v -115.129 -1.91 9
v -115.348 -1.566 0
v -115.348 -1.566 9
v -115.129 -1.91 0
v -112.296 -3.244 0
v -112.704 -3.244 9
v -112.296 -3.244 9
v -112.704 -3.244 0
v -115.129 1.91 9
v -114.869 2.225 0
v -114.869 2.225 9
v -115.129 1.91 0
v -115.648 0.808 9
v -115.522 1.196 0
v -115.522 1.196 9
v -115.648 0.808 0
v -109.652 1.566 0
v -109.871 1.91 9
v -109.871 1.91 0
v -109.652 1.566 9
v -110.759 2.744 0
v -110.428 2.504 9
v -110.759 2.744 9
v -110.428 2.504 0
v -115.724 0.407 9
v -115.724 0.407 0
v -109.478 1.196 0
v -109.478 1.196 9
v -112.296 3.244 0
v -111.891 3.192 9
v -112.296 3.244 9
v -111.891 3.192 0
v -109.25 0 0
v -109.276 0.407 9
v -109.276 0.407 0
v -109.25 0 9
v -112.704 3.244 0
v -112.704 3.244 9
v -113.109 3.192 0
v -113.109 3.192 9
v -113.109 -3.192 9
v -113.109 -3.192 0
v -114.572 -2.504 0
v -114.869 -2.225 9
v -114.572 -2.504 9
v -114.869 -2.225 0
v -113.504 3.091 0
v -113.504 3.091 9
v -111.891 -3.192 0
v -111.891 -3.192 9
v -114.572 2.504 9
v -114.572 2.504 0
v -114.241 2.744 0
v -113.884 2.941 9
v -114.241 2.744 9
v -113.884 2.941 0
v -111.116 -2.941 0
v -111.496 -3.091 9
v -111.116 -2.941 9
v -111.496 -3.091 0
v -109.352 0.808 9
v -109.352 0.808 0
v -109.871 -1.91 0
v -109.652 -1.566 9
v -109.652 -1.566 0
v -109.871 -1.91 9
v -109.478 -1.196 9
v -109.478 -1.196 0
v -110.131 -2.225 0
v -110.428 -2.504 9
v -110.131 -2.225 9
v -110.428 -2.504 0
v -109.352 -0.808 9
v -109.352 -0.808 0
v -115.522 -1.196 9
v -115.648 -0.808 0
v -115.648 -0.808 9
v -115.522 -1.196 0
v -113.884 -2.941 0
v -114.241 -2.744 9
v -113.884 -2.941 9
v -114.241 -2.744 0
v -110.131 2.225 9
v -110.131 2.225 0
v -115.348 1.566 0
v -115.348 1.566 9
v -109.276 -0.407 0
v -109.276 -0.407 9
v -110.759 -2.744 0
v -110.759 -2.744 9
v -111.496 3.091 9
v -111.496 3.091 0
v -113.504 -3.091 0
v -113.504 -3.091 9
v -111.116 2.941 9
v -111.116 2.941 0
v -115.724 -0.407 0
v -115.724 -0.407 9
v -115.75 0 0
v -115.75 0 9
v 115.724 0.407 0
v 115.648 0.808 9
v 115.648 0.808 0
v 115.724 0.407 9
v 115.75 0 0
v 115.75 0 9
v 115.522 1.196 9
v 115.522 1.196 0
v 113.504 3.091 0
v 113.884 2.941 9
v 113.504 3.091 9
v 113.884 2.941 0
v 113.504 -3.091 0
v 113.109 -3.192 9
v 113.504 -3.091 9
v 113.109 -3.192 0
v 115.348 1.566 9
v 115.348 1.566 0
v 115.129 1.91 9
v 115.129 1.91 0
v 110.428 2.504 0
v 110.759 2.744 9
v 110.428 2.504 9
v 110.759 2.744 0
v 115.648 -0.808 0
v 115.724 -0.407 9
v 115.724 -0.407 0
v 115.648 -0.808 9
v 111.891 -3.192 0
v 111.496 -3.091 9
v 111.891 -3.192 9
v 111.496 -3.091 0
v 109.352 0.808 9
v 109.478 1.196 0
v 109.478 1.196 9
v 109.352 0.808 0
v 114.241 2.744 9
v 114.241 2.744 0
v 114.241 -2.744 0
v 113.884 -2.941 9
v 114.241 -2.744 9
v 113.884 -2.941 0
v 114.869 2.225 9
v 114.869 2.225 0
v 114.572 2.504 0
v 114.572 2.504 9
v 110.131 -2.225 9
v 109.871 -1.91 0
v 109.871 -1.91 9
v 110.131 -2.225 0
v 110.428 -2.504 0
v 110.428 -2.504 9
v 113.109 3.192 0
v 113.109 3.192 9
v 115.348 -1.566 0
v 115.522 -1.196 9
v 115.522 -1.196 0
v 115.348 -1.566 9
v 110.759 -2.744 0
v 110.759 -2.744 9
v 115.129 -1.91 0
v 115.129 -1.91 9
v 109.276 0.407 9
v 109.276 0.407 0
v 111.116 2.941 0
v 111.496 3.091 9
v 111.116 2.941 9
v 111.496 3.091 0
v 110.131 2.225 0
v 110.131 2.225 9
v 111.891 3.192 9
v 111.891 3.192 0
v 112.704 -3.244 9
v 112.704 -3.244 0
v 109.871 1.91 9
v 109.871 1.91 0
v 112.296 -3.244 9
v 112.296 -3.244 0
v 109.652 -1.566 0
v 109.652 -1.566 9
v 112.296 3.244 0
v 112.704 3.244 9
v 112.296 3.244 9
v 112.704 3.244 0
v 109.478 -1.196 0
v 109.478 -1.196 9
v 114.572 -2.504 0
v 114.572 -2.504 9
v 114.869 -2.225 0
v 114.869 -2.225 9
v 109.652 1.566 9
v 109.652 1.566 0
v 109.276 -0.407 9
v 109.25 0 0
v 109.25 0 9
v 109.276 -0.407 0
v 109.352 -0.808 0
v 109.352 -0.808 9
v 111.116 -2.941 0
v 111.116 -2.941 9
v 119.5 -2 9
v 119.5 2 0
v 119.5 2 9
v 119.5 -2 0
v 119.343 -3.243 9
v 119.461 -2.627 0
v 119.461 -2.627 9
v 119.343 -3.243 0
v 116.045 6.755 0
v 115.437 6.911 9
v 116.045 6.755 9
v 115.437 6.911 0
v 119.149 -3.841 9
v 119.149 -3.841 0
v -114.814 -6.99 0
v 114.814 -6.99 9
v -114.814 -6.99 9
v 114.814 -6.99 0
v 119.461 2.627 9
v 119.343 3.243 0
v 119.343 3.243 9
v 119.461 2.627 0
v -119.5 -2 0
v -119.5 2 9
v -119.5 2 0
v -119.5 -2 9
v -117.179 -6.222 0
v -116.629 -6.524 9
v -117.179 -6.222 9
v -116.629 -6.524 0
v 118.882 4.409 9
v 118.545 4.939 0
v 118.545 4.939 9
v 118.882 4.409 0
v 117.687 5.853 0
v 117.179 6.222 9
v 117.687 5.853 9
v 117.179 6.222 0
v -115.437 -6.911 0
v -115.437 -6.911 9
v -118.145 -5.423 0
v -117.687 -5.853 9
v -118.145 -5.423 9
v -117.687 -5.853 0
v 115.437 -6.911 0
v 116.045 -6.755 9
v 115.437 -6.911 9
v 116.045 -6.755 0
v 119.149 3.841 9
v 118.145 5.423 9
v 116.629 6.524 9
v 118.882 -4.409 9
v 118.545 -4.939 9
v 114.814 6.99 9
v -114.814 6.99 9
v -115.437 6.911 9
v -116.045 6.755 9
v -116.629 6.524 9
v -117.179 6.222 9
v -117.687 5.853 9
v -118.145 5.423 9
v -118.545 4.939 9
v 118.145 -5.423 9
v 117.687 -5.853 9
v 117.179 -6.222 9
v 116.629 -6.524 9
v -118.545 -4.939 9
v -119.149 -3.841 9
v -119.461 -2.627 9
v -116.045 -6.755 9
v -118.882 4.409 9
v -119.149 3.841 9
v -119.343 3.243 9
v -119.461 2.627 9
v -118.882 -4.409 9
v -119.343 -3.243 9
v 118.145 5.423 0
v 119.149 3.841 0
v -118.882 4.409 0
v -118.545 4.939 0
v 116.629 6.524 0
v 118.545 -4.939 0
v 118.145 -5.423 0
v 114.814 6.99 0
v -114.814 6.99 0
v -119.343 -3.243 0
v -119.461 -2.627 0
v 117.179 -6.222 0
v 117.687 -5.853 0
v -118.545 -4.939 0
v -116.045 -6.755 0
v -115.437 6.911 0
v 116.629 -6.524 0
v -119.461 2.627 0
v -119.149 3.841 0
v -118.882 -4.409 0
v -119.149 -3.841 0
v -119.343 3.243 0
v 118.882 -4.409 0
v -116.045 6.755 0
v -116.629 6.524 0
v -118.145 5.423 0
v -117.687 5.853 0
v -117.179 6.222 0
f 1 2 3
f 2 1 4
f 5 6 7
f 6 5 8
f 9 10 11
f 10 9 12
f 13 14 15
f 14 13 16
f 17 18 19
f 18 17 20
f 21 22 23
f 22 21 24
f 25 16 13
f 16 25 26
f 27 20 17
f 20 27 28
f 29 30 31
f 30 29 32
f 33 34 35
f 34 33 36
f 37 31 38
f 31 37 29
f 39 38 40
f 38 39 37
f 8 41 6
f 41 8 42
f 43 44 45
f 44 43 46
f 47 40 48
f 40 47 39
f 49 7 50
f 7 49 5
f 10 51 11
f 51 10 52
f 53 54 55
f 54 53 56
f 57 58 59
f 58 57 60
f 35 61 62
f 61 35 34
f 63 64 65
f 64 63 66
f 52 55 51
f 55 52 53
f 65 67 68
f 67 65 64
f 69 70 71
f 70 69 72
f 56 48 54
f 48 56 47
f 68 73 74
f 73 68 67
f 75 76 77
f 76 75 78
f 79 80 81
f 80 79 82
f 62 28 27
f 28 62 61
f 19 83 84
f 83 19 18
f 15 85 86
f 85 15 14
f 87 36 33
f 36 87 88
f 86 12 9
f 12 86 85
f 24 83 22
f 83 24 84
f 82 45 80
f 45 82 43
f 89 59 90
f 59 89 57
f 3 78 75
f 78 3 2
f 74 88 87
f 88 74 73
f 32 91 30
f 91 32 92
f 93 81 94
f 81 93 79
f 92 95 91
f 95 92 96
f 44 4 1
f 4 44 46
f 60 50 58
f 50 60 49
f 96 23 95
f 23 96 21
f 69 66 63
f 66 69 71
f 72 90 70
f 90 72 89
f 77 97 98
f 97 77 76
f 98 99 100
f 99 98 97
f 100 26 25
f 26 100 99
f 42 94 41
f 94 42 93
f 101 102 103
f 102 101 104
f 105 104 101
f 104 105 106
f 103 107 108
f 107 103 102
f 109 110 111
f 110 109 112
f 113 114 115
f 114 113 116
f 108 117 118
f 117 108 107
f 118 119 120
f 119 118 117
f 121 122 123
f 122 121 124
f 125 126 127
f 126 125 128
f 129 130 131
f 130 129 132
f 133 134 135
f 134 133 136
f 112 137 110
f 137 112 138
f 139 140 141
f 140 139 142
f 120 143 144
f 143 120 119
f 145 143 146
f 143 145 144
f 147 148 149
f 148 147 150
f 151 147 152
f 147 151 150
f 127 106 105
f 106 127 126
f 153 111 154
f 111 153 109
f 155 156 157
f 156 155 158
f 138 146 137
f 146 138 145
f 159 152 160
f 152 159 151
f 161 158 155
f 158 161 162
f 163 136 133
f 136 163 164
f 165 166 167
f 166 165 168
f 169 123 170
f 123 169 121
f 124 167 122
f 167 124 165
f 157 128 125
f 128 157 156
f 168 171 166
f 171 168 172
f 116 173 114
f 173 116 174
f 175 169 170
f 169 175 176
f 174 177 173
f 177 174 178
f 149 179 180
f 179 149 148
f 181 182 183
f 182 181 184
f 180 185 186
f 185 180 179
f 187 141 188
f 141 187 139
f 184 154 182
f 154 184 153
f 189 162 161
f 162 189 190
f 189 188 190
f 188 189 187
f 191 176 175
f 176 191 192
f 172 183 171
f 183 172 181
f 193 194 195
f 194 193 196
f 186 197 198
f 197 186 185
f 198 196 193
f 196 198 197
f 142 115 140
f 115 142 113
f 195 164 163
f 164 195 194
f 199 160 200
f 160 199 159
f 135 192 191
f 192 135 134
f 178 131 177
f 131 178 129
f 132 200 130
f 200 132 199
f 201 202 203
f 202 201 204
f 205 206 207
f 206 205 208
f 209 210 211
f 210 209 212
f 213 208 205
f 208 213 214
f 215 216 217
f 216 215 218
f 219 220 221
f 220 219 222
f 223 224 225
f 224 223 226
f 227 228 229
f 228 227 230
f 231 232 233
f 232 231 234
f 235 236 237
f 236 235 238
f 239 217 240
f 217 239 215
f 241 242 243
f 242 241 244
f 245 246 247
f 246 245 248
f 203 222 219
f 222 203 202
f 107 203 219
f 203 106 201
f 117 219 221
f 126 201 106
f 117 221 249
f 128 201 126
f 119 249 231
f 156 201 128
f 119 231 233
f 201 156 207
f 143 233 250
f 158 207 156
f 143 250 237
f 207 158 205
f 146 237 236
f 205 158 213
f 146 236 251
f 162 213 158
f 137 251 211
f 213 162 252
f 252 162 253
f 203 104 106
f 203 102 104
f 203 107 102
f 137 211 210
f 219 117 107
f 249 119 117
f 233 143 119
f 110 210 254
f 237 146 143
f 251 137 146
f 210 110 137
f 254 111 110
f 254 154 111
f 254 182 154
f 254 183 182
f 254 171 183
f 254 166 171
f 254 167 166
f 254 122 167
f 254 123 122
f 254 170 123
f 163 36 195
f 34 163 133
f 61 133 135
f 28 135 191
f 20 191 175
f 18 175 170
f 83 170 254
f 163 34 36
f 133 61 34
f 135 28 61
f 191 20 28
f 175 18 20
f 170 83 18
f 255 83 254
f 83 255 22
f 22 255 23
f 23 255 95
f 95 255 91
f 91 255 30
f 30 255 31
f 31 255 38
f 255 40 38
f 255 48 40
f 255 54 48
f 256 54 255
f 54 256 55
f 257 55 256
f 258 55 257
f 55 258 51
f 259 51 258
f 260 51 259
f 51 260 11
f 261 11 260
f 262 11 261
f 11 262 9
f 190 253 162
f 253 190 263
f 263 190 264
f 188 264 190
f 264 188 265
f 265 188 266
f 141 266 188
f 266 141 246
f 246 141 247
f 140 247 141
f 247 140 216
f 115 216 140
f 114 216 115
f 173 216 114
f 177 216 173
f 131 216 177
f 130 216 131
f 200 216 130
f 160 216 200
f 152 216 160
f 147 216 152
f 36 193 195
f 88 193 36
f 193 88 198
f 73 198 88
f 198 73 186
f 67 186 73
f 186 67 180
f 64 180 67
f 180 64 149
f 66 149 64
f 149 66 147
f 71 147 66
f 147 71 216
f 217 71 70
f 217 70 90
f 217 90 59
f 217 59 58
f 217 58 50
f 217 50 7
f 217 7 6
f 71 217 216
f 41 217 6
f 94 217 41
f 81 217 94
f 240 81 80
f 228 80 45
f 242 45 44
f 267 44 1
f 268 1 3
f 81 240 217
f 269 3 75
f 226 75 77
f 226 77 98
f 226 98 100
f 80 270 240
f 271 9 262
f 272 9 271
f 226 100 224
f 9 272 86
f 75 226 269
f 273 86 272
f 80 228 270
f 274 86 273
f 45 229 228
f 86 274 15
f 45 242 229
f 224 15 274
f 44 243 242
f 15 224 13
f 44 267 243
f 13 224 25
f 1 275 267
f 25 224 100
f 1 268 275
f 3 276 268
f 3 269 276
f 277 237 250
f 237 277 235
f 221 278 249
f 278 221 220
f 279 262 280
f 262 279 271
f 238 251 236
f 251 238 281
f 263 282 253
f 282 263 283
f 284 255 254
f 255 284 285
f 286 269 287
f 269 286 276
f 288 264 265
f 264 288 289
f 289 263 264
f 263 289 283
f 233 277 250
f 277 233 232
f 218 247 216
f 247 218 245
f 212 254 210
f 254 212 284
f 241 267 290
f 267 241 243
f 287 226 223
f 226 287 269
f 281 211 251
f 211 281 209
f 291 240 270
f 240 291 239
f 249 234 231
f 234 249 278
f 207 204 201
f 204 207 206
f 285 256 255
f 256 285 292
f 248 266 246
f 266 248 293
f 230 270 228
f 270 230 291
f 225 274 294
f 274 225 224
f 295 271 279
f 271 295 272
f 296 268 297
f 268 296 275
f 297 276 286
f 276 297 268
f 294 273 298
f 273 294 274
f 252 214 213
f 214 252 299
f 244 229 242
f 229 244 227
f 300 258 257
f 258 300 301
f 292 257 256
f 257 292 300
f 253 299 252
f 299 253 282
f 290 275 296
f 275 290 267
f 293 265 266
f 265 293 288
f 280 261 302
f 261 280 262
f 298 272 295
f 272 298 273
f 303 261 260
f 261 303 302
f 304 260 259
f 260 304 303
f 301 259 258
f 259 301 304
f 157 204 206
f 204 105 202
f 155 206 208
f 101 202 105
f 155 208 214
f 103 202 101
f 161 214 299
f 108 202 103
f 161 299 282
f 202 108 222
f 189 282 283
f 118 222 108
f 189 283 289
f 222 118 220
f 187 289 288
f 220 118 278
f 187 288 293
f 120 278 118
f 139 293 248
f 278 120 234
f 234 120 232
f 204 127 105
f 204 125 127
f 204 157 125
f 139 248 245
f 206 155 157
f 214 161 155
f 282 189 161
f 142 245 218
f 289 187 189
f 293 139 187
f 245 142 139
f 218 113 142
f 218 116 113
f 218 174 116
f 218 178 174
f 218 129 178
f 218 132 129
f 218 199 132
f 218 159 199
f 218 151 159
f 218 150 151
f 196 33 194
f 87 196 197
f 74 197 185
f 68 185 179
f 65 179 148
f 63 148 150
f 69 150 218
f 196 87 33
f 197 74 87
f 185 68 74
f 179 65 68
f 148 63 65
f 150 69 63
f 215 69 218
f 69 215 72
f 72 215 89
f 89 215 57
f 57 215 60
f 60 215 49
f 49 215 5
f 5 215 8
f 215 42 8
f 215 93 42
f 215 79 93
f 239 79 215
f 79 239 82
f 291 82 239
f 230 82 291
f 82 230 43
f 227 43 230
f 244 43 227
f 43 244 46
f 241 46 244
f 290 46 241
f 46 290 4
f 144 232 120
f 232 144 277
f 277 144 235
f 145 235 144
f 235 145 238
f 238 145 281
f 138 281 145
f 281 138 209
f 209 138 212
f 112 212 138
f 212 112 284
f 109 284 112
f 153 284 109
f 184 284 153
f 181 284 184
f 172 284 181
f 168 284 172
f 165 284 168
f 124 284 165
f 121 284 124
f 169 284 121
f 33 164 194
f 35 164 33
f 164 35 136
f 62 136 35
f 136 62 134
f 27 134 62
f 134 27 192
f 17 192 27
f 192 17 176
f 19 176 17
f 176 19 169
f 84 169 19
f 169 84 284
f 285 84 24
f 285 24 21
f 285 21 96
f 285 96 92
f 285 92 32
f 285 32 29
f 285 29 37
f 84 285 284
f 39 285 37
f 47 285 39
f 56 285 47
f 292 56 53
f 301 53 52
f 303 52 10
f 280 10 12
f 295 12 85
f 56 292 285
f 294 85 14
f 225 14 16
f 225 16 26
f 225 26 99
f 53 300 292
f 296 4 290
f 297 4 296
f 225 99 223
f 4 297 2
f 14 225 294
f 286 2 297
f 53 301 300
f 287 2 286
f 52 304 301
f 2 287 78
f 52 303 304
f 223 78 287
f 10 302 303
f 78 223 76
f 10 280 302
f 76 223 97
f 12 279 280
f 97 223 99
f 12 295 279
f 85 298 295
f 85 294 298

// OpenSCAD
$fn = 50;


difference() {
	union() {
		hull() {
			translate(v = [-114.5000000000, 2.0000000000, 0]) {
				cylinder(h = 9, r = 5);
			}
			translate(v = [114.5000000000, 2.0000000000, 0]) {
				cylinder(h = 9, r = 5);
			}
			translate(v = [-114.5000000000, -2.0000000000, 0]) {
				cylinder(h = 9, r = 5);
			}
			translate(v = [114.5000000000, -2.0000000000, 0]) {
				cylinder(h = 9, r = 5);
			}
		}
	}
	union() {
		translate(v = [-112.5000000000, 0.0000000000, -100.0000000000]) {
			cylinder(h = 200, r = 3.2500000000);
		}
		translate(v = [-112.5000000000, 0.0000000000, -100.0000000000]) {
			cylinder(h = 200, r = 3.2500000000);
		}
		translate(v = [112.5000000000, 0.0000000000, -100.0000000000]) {
			cylinder(h = 200, r = 3.2500000000);
		}
		translate(v = [112.5000000000, 0.0000000000, -100.0000000000]) {
			cylinder(h = 200, r = 3.2500000000);
		}
	}
}
